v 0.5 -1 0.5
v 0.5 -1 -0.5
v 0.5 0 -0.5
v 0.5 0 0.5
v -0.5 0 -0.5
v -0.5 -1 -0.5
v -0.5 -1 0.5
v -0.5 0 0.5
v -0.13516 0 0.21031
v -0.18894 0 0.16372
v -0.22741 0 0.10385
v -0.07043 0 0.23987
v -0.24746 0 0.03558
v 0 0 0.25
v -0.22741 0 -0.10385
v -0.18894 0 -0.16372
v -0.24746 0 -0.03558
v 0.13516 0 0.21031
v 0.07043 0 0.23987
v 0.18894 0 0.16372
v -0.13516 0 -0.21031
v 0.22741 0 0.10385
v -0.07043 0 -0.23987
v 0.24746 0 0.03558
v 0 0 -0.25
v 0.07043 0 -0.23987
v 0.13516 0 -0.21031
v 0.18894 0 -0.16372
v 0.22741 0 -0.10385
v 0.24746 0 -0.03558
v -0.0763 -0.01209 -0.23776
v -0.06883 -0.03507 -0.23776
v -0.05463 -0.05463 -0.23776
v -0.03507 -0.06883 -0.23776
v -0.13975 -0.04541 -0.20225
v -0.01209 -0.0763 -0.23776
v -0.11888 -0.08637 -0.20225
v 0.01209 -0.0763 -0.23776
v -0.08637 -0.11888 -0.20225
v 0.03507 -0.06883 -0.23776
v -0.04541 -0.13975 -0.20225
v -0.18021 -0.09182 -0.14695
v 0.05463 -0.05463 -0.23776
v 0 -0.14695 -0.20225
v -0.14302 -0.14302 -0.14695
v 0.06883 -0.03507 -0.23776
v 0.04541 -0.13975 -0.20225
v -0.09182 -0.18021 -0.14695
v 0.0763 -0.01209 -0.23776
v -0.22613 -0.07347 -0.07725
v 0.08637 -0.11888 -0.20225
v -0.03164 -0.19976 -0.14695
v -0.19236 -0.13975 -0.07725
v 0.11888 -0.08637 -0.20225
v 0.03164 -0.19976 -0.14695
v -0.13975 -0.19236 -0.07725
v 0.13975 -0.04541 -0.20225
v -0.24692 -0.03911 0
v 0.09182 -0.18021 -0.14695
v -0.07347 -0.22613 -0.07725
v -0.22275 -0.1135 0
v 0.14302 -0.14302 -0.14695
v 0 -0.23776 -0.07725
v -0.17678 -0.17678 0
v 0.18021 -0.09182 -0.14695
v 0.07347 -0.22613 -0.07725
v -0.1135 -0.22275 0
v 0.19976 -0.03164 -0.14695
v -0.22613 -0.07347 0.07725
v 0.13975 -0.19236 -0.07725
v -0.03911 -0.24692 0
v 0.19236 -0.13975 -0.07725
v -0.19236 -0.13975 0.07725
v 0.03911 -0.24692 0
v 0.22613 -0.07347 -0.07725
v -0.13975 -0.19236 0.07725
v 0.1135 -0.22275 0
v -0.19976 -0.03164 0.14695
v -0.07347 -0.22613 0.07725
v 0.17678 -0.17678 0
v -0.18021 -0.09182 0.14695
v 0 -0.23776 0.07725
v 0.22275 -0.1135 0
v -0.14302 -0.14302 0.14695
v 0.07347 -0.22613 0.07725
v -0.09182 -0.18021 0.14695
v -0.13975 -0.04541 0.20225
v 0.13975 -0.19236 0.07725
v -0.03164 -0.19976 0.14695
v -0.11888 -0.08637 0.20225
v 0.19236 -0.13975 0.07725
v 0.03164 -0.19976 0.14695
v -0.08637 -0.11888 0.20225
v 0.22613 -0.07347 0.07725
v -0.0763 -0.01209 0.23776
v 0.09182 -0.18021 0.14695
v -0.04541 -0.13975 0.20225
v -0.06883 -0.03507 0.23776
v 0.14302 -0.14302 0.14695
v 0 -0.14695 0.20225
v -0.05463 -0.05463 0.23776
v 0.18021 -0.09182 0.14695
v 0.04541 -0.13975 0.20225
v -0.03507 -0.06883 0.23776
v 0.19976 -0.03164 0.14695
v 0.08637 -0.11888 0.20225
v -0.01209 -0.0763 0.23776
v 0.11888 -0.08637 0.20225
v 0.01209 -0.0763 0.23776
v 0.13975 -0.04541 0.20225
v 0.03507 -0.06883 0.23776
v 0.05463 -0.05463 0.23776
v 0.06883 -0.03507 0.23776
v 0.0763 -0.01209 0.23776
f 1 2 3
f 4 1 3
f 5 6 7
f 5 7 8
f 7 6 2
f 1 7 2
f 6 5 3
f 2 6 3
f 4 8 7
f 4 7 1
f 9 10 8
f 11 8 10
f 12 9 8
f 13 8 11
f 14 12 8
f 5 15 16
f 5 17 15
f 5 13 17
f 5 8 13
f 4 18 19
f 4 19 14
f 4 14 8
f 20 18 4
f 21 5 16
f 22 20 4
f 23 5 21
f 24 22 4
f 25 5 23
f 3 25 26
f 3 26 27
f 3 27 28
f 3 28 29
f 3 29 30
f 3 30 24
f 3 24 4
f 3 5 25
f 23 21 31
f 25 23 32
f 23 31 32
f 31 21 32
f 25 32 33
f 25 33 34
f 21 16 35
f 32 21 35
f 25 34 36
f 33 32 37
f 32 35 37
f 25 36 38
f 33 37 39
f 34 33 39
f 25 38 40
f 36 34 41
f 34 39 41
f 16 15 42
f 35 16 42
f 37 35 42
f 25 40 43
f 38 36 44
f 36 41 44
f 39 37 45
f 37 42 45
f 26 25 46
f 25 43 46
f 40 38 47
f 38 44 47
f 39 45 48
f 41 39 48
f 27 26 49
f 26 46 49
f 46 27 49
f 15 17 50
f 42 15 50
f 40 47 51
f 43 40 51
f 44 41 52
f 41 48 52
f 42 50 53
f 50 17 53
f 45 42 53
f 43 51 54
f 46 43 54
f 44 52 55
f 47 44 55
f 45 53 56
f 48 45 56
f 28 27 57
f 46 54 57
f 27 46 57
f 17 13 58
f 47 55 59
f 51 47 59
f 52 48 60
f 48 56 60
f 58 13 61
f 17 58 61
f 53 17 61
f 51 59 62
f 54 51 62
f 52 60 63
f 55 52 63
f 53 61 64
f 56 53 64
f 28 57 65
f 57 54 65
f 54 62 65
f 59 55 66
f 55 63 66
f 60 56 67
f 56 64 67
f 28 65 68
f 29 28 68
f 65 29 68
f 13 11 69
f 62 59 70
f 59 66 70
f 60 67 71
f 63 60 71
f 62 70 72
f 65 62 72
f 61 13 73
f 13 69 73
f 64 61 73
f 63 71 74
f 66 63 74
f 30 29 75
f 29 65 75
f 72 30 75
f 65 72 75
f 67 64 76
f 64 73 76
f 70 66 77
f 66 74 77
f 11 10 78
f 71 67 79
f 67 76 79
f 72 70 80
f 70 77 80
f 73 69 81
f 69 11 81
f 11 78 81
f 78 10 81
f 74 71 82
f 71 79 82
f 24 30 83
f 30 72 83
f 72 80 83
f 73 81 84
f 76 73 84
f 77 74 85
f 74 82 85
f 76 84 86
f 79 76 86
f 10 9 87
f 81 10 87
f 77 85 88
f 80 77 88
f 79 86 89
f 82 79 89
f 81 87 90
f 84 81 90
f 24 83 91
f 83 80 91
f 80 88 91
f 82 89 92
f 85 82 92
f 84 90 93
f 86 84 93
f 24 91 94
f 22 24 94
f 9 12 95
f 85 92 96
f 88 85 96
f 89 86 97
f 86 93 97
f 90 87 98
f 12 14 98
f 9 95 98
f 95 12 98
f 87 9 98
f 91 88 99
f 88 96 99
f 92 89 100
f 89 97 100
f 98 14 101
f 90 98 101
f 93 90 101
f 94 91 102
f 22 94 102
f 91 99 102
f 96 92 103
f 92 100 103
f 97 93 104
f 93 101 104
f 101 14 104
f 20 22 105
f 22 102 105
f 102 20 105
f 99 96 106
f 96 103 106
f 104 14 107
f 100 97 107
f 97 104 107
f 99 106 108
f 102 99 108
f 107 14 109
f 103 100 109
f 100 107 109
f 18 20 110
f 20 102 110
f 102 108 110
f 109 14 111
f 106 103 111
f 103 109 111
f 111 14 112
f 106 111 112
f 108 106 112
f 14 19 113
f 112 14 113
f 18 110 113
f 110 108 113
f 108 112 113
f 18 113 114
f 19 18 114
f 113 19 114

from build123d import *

# Parameters (mm, degrees)
BOX_W     = 1
BOX_H     = 1
BOX_DEPTH = 1


with BuildPart() as sphere:
    # Sphere → Sphere (revolve)
    with BuildSketch(Plane.XZ):
        with BuildLine():
            ThreePointArc((0, -0.25), (0.25, 0), (0, 0.25))
            Line((0, 0.25), (0, -0.25))
        make_face()
    revolve(axis=Axis((0, 0, 0), (0, 0, 1)))


with BuildPart() as cut:
    # Box → Box (new body)
    with BuildSketch(Plane(origin=(-0.5, -1, -0.5), x_dir=(1, 0, 0), z_dir=(0, 0, 1))):
        with Locations((0.5, 0.5)):
            Rectangle(BOX_W, BOX_H)
    extrude(amount=BOX_DEPTH)

    # Cut: cut Sphere
    add(sphere.part, mode=Mode.SUBTRACT)


solid = cut.part
